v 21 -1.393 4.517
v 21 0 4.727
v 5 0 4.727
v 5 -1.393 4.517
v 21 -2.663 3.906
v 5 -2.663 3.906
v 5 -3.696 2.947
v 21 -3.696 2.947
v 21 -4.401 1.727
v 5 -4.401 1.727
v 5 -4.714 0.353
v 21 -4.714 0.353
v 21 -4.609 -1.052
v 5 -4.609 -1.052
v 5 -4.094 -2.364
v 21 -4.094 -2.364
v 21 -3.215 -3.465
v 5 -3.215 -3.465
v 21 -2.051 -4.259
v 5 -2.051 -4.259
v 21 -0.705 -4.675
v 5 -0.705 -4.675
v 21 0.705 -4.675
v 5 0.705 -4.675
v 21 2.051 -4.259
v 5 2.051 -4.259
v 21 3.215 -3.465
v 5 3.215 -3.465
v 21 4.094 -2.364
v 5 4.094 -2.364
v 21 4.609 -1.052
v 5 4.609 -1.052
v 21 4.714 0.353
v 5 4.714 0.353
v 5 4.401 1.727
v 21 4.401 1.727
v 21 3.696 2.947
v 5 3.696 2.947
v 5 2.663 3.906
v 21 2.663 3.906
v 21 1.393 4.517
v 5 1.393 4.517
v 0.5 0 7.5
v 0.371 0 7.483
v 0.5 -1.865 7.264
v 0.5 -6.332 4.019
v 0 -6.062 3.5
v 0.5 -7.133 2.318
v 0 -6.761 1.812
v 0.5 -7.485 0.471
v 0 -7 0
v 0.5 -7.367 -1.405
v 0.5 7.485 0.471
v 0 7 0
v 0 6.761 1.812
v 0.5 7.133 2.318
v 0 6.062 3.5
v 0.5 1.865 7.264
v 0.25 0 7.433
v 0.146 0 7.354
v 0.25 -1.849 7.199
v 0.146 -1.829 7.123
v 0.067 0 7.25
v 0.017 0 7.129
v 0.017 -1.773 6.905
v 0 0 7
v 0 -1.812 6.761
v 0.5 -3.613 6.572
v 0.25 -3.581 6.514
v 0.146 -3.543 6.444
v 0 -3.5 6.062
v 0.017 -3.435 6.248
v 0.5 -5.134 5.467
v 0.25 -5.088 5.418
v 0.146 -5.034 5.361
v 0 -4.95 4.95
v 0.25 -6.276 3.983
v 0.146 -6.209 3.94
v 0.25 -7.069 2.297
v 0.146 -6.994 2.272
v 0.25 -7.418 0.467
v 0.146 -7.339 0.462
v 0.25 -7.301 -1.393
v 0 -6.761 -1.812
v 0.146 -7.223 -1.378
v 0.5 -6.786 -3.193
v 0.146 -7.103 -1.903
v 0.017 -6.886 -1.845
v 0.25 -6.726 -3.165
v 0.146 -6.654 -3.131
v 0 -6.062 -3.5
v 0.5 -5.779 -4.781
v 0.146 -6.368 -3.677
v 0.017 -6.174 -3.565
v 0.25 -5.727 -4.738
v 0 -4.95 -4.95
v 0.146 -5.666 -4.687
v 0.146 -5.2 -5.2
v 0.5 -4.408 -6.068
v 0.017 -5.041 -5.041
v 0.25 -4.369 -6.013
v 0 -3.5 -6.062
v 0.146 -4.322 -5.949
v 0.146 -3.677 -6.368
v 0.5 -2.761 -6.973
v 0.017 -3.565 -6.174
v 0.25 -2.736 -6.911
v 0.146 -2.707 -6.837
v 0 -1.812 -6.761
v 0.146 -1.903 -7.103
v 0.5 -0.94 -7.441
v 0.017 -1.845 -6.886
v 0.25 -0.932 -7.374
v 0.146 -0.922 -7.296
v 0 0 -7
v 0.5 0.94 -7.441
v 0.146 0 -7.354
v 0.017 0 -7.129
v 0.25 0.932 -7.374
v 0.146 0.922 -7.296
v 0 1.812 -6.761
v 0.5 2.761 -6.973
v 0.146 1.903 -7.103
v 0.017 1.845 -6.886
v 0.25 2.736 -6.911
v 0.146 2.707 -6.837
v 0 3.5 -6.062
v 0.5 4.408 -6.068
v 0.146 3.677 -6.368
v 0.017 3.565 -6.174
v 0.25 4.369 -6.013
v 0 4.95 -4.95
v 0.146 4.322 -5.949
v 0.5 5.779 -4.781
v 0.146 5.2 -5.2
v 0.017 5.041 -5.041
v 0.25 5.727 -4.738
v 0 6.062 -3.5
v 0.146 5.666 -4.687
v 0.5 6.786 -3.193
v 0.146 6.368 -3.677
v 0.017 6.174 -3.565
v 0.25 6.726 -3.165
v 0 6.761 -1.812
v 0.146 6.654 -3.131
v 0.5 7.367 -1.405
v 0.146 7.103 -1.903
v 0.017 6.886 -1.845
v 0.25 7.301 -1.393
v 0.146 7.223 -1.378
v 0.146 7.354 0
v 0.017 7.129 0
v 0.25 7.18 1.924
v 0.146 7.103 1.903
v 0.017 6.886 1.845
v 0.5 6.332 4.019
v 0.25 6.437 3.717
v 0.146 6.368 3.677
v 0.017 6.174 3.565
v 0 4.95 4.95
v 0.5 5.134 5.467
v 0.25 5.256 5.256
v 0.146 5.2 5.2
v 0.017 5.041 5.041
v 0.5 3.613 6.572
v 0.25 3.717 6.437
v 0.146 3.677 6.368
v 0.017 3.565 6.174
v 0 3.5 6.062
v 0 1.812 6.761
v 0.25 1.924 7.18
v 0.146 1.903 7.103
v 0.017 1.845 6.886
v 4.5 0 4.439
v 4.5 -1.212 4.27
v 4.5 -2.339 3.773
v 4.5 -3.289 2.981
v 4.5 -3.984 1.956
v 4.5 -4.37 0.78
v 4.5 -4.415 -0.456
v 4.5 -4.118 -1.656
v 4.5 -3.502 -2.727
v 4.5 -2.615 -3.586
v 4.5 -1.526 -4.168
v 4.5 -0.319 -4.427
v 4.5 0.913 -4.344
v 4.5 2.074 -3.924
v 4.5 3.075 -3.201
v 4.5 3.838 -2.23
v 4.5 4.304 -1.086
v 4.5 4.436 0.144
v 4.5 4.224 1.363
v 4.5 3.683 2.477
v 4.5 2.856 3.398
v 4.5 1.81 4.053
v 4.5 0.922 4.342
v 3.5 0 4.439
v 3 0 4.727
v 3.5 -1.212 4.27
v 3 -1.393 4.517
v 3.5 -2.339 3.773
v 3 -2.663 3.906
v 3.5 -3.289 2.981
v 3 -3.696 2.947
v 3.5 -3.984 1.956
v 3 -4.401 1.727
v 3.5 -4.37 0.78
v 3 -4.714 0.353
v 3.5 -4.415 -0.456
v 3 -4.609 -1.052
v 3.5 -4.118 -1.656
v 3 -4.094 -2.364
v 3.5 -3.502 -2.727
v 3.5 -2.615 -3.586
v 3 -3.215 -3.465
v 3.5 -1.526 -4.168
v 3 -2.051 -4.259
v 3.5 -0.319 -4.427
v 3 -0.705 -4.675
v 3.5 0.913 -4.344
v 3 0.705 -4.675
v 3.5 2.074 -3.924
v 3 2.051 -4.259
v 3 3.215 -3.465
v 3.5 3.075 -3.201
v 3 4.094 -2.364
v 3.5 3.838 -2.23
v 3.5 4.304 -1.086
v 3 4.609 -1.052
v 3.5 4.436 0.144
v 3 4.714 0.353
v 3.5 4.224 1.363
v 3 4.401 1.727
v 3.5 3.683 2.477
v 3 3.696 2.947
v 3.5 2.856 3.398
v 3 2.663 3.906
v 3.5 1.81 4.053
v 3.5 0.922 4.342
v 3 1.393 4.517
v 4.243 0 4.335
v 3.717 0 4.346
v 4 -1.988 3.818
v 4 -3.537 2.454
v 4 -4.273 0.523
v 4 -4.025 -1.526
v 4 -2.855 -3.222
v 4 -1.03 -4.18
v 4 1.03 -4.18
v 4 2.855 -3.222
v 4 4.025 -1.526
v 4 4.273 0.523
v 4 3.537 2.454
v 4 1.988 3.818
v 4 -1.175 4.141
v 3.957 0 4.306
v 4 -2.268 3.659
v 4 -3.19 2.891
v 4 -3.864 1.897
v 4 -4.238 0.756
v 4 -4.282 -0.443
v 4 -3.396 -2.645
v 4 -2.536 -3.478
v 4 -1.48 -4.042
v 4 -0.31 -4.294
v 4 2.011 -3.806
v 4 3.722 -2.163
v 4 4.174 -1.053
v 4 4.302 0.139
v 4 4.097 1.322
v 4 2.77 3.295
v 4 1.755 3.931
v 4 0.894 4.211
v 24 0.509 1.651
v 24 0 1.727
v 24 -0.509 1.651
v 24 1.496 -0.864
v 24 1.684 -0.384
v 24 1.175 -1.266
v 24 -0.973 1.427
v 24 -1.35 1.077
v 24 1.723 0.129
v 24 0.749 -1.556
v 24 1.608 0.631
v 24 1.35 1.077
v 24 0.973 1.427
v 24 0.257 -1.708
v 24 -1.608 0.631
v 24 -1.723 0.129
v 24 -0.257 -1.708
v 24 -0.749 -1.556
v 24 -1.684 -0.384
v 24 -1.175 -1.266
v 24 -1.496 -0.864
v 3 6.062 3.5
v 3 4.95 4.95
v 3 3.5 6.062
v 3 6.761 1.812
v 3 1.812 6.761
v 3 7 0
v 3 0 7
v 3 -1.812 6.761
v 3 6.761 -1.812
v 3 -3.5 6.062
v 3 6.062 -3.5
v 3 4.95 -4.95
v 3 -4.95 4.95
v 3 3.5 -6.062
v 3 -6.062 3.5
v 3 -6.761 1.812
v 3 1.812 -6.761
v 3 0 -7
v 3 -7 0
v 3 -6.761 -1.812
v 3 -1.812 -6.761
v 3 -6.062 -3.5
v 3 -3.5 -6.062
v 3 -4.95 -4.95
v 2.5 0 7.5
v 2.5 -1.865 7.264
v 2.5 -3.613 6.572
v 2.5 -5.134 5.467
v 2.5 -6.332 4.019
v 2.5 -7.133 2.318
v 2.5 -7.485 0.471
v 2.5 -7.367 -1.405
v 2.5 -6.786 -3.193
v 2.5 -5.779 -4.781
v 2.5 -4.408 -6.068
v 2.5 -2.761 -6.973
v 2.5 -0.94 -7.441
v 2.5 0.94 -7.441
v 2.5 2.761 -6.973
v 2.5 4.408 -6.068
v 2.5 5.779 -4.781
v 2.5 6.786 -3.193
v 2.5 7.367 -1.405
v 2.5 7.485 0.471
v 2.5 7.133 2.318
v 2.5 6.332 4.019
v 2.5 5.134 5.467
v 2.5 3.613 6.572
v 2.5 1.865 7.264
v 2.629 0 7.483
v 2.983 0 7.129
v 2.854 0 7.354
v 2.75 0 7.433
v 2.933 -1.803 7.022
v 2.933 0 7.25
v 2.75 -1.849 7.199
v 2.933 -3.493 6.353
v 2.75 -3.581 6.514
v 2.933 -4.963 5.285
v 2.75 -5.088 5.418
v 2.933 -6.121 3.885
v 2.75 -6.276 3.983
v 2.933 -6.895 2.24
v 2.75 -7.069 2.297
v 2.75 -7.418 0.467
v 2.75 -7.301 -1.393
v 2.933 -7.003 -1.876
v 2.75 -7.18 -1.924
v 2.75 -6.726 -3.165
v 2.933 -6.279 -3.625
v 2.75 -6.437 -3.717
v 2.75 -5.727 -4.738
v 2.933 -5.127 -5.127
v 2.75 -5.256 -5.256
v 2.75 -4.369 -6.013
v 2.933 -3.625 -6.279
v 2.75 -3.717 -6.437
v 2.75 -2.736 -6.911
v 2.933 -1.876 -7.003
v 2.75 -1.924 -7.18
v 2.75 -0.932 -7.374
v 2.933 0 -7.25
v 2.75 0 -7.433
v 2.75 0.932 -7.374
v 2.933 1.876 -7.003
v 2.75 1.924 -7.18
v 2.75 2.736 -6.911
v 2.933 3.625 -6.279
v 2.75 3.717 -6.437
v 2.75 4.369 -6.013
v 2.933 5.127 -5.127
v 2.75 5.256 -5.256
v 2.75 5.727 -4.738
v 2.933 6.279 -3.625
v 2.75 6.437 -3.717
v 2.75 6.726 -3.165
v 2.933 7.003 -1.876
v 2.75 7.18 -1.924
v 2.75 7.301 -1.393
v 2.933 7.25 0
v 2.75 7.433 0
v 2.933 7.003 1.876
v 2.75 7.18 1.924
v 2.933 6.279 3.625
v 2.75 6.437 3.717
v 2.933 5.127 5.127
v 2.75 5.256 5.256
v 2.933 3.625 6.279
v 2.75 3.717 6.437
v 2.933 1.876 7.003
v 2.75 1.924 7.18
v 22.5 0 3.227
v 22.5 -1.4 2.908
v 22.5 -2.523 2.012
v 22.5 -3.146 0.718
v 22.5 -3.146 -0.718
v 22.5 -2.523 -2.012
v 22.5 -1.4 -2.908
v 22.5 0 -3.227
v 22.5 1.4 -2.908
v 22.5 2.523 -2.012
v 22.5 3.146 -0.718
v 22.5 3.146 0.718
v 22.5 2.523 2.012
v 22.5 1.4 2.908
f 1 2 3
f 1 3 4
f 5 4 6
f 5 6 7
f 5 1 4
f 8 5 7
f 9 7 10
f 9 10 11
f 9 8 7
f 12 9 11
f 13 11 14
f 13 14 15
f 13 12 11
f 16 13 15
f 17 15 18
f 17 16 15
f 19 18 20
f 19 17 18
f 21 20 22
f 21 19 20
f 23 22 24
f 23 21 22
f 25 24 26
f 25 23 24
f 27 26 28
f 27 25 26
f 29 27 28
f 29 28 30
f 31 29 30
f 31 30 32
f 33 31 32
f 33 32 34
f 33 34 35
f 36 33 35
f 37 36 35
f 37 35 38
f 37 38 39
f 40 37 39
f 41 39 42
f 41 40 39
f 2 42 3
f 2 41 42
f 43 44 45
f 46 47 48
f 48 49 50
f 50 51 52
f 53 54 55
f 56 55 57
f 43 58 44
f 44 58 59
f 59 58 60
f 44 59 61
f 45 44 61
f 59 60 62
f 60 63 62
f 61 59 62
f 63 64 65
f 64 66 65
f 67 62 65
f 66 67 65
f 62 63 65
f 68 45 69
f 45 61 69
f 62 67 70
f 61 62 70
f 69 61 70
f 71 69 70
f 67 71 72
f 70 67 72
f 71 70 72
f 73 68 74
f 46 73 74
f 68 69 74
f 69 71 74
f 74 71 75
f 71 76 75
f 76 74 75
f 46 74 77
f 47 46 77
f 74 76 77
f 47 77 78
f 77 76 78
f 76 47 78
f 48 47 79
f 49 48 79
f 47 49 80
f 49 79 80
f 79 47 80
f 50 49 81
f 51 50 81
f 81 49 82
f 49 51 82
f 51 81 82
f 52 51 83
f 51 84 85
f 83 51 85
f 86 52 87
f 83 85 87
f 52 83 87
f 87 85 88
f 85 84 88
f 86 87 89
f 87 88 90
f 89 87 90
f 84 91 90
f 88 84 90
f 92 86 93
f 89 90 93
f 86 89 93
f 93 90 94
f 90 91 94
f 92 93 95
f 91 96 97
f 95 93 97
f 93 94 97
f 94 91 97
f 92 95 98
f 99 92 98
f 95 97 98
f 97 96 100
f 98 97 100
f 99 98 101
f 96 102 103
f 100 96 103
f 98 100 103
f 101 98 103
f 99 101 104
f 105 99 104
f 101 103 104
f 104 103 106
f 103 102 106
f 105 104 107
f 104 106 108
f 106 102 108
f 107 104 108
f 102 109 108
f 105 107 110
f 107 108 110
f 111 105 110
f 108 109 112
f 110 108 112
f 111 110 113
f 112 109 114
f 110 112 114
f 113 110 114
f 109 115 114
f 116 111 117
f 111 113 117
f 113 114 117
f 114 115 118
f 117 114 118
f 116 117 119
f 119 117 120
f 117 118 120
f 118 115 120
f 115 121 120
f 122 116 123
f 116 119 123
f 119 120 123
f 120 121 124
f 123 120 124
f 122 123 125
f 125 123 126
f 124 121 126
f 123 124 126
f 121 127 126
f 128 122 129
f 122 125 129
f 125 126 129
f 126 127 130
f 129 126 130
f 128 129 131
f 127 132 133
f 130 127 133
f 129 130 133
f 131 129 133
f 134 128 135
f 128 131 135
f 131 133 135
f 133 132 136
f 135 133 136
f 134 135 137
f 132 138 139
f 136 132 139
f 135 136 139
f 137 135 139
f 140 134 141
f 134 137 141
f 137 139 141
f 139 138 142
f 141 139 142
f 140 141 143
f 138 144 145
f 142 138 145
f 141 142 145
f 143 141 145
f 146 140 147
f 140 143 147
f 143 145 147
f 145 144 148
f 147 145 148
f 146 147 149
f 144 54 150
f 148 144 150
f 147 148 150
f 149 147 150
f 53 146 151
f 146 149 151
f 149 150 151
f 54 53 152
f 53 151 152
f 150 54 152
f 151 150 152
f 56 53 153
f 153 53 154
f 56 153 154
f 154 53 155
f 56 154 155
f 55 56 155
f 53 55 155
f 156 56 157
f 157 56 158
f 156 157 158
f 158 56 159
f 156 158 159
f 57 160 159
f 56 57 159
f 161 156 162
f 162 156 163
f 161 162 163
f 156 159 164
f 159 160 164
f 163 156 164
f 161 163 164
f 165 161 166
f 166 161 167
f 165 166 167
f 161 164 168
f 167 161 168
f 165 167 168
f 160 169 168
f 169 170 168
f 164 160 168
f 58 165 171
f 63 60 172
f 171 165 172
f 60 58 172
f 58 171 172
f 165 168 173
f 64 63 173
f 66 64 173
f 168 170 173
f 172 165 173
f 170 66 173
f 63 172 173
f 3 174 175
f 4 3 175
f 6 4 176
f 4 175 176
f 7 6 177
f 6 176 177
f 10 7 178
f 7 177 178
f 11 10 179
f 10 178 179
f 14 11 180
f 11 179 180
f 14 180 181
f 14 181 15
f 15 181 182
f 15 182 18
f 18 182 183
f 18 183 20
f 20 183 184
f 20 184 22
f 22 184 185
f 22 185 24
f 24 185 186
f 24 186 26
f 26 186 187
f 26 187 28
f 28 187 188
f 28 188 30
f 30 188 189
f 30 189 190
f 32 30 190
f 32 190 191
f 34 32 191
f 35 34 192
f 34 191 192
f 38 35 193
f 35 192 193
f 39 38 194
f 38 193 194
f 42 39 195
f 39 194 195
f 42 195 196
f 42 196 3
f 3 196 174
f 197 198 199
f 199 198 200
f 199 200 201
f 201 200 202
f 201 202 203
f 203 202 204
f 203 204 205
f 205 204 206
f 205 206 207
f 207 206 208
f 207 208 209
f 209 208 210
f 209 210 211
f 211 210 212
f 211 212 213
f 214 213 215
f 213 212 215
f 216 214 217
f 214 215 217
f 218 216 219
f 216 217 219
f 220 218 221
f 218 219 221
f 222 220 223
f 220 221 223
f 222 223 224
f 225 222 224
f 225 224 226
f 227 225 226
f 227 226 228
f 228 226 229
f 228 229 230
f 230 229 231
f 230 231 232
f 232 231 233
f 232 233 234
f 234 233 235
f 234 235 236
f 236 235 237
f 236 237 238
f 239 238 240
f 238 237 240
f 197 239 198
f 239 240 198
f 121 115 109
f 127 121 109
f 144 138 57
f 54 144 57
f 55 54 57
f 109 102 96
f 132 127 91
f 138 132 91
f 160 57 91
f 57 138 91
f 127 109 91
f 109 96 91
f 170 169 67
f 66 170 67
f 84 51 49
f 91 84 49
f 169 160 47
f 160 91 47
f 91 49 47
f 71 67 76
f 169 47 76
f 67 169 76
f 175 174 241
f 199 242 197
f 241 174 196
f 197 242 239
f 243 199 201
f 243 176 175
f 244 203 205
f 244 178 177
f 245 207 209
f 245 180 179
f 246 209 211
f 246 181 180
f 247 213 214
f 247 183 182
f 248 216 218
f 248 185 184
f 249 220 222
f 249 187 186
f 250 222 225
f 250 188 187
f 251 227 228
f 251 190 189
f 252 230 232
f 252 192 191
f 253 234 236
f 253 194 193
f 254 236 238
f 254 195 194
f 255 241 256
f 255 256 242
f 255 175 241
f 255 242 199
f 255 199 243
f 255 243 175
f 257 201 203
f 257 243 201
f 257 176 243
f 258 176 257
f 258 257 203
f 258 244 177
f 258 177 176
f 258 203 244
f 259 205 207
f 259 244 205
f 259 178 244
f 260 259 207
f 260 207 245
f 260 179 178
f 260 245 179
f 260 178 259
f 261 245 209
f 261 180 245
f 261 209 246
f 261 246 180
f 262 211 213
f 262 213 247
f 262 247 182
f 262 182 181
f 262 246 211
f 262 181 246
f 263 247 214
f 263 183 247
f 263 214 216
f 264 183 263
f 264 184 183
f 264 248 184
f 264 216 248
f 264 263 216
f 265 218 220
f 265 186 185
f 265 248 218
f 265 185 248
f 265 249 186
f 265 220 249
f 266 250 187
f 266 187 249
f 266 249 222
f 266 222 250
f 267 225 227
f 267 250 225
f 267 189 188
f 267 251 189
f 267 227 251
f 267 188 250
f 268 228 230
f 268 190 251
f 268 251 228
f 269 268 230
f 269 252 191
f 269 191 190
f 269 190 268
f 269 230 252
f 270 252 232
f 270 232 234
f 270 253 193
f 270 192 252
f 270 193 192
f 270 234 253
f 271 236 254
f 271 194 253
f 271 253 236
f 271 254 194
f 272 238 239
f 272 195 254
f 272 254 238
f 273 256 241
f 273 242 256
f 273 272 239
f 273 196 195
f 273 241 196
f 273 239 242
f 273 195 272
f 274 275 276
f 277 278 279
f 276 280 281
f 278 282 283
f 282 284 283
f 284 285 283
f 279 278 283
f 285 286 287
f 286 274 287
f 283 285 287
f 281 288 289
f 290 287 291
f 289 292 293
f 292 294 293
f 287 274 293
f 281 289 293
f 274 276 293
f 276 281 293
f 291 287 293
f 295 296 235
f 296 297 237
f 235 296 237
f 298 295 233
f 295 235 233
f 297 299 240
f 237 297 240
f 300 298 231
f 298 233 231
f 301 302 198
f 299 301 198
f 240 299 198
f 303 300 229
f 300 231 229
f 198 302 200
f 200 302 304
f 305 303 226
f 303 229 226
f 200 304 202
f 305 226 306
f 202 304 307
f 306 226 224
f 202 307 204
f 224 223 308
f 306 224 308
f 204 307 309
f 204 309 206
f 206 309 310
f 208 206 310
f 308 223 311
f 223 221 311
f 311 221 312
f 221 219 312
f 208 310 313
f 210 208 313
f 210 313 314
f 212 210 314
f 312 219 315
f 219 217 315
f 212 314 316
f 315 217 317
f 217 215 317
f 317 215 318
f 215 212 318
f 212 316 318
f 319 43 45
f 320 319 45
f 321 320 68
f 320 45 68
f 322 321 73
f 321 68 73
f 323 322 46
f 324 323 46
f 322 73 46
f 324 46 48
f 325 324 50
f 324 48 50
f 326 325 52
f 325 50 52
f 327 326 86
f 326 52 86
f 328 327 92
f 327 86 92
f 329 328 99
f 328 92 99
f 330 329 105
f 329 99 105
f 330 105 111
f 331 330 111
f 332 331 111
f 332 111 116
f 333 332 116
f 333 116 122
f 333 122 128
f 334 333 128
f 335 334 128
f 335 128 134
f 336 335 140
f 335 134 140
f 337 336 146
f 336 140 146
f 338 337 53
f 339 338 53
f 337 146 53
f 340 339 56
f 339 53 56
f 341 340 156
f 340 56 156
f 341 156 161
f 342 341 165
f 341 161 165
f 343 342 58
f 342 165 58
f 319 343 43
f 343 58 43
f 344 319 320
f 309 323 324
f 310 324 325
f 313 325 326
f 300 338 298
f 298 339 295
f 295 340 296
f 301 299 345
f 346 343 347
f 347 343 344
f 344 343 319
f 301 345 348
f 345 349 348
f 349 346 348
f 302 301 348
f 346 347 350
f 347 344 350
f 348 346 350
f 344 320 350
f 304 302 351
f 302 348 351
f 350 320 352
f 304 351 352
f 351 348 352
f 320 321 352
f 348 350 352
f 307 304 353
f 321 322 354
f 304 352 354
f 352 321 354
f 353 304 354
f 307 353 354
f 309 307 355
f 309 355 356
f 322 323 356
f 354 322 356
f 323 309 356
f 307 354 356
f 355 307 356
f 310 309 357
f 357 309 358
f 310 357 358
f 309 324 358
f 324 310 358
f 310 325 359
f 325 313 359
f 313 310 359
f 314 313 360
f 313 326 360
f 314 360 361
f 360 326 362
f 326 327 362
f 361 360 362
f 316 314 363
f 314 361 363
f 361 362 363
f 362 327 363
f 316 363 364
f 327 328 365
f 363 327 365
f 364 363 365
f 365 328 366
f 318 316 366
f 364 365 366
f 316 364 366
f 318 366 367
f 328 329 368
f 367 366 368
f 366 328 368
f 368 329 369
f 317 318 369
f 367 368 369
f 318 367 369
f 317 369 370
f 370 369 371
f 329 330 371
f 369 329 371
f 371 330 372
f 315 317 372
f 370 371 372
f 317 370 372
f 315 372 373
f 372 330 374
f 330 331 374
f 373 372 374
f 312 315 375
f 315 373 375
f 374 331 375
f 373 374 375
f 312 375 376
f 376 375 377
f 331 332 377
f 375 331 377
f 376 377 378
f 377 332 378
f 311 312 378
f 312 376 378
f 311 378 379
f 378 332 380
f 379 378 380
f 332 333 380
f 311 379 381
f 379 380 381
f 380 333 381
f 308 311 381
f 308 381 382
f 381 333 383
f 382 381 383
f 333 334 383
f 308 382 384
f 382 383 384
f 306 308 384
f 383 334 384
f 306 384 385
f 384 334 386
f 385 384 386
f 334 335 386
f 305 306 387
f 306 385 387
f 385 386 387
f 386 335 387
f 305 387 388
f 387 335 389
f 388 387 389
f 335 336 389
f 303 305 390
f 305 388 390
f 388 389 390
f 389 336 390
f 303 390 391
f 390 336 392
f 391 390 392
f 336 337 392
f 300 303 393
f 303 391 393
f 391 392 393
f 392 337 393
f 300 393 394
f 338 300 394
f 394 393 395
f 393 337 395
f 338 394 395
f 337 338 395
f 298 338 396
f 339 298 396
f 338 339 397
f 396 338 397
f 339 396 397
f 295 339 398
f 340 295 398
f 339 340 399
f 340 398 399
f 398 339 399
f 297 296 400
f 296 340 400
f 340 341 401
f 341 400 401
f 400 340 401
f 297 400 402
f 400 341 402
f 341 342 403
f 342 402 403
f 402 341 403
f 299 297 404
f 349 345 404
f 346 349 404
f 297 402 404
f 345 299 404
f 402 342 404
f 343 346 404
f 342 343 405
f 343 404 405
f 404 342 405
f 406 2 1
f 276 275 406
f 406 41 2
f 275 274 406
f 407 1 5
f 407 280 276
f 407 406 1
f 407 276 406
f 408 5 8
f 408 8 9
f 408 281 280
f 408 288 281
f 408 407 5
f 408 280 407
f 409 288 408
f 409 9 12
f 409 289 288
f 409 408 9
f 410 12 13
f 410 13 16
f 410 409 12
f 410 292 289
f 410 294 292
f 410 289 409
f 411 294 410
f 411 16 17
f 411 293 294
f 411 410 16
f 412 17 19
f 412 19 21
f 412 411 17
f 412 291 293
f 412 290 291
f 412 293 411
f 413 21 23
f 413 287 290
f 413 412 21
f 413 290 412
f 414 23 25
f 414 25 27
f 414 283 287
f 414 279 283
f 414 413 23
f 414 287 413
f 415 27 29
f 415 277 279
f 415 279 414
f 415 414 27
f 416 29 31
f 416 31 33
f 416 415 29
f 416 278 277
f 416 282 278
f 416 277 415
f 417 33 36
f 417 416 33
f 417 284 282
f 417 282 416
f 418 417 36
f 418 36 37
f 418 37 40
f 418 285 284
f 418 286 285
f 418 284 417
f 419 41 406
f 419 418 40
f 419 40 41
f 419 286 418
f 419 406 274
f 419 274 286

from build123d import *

# Parameters (mm, degrees)
F0_W     = 19
F0_H     = 4.72735
F2_R     = 1
F3_R     = 0.5
F4_SIZE2 = 3
F4_SIZE  = 3


with BuildPart() as f1:
    # F0 (on Front) → F1 (revolve)
    with BuildSketch(Plane.XZ):
        Polygon((0, 7.5), (0, 0), (3, 0), (3, 4.72735), (3, 7.5), align=None)
        Polygon((3, 4.72735), (3, 0), (4, 0), (4, 4.15), align=None)
        Polygon((4, 4.15), (4, 0), (5, 0), (5, 4.72735), align=None)
        with Locations((14.5, 2.363675)):
            Rectangle(F0_W, F0_H)
    revolve(axis=Axis((12, 0, 0), (1, 0, 0)))

    # F2
    f2_edges = [f1.edges().sort_by_distance(p)[0] for p in [
        (4, 0, -4.15),
    ]]
    fillet(f2_edges, radius=F2_R)

    # F3
    f3_edges = [f1.edges().sort_by_distance(p)[0] for p in [
        (0, 0, -7.5),
        (3, 0, -7.5),
    ]]
    fillet(f3_edges, radius=F3_R)

    # F4
    f4_edges = [f1.edges().sort_by_distance(p)[0] for p in [
        (24, 0, -4.72735),
    ]]
    chamfer(f4_edges, length=F4_SIZE, length2=F4_SIZE2)


solid = f1.part
